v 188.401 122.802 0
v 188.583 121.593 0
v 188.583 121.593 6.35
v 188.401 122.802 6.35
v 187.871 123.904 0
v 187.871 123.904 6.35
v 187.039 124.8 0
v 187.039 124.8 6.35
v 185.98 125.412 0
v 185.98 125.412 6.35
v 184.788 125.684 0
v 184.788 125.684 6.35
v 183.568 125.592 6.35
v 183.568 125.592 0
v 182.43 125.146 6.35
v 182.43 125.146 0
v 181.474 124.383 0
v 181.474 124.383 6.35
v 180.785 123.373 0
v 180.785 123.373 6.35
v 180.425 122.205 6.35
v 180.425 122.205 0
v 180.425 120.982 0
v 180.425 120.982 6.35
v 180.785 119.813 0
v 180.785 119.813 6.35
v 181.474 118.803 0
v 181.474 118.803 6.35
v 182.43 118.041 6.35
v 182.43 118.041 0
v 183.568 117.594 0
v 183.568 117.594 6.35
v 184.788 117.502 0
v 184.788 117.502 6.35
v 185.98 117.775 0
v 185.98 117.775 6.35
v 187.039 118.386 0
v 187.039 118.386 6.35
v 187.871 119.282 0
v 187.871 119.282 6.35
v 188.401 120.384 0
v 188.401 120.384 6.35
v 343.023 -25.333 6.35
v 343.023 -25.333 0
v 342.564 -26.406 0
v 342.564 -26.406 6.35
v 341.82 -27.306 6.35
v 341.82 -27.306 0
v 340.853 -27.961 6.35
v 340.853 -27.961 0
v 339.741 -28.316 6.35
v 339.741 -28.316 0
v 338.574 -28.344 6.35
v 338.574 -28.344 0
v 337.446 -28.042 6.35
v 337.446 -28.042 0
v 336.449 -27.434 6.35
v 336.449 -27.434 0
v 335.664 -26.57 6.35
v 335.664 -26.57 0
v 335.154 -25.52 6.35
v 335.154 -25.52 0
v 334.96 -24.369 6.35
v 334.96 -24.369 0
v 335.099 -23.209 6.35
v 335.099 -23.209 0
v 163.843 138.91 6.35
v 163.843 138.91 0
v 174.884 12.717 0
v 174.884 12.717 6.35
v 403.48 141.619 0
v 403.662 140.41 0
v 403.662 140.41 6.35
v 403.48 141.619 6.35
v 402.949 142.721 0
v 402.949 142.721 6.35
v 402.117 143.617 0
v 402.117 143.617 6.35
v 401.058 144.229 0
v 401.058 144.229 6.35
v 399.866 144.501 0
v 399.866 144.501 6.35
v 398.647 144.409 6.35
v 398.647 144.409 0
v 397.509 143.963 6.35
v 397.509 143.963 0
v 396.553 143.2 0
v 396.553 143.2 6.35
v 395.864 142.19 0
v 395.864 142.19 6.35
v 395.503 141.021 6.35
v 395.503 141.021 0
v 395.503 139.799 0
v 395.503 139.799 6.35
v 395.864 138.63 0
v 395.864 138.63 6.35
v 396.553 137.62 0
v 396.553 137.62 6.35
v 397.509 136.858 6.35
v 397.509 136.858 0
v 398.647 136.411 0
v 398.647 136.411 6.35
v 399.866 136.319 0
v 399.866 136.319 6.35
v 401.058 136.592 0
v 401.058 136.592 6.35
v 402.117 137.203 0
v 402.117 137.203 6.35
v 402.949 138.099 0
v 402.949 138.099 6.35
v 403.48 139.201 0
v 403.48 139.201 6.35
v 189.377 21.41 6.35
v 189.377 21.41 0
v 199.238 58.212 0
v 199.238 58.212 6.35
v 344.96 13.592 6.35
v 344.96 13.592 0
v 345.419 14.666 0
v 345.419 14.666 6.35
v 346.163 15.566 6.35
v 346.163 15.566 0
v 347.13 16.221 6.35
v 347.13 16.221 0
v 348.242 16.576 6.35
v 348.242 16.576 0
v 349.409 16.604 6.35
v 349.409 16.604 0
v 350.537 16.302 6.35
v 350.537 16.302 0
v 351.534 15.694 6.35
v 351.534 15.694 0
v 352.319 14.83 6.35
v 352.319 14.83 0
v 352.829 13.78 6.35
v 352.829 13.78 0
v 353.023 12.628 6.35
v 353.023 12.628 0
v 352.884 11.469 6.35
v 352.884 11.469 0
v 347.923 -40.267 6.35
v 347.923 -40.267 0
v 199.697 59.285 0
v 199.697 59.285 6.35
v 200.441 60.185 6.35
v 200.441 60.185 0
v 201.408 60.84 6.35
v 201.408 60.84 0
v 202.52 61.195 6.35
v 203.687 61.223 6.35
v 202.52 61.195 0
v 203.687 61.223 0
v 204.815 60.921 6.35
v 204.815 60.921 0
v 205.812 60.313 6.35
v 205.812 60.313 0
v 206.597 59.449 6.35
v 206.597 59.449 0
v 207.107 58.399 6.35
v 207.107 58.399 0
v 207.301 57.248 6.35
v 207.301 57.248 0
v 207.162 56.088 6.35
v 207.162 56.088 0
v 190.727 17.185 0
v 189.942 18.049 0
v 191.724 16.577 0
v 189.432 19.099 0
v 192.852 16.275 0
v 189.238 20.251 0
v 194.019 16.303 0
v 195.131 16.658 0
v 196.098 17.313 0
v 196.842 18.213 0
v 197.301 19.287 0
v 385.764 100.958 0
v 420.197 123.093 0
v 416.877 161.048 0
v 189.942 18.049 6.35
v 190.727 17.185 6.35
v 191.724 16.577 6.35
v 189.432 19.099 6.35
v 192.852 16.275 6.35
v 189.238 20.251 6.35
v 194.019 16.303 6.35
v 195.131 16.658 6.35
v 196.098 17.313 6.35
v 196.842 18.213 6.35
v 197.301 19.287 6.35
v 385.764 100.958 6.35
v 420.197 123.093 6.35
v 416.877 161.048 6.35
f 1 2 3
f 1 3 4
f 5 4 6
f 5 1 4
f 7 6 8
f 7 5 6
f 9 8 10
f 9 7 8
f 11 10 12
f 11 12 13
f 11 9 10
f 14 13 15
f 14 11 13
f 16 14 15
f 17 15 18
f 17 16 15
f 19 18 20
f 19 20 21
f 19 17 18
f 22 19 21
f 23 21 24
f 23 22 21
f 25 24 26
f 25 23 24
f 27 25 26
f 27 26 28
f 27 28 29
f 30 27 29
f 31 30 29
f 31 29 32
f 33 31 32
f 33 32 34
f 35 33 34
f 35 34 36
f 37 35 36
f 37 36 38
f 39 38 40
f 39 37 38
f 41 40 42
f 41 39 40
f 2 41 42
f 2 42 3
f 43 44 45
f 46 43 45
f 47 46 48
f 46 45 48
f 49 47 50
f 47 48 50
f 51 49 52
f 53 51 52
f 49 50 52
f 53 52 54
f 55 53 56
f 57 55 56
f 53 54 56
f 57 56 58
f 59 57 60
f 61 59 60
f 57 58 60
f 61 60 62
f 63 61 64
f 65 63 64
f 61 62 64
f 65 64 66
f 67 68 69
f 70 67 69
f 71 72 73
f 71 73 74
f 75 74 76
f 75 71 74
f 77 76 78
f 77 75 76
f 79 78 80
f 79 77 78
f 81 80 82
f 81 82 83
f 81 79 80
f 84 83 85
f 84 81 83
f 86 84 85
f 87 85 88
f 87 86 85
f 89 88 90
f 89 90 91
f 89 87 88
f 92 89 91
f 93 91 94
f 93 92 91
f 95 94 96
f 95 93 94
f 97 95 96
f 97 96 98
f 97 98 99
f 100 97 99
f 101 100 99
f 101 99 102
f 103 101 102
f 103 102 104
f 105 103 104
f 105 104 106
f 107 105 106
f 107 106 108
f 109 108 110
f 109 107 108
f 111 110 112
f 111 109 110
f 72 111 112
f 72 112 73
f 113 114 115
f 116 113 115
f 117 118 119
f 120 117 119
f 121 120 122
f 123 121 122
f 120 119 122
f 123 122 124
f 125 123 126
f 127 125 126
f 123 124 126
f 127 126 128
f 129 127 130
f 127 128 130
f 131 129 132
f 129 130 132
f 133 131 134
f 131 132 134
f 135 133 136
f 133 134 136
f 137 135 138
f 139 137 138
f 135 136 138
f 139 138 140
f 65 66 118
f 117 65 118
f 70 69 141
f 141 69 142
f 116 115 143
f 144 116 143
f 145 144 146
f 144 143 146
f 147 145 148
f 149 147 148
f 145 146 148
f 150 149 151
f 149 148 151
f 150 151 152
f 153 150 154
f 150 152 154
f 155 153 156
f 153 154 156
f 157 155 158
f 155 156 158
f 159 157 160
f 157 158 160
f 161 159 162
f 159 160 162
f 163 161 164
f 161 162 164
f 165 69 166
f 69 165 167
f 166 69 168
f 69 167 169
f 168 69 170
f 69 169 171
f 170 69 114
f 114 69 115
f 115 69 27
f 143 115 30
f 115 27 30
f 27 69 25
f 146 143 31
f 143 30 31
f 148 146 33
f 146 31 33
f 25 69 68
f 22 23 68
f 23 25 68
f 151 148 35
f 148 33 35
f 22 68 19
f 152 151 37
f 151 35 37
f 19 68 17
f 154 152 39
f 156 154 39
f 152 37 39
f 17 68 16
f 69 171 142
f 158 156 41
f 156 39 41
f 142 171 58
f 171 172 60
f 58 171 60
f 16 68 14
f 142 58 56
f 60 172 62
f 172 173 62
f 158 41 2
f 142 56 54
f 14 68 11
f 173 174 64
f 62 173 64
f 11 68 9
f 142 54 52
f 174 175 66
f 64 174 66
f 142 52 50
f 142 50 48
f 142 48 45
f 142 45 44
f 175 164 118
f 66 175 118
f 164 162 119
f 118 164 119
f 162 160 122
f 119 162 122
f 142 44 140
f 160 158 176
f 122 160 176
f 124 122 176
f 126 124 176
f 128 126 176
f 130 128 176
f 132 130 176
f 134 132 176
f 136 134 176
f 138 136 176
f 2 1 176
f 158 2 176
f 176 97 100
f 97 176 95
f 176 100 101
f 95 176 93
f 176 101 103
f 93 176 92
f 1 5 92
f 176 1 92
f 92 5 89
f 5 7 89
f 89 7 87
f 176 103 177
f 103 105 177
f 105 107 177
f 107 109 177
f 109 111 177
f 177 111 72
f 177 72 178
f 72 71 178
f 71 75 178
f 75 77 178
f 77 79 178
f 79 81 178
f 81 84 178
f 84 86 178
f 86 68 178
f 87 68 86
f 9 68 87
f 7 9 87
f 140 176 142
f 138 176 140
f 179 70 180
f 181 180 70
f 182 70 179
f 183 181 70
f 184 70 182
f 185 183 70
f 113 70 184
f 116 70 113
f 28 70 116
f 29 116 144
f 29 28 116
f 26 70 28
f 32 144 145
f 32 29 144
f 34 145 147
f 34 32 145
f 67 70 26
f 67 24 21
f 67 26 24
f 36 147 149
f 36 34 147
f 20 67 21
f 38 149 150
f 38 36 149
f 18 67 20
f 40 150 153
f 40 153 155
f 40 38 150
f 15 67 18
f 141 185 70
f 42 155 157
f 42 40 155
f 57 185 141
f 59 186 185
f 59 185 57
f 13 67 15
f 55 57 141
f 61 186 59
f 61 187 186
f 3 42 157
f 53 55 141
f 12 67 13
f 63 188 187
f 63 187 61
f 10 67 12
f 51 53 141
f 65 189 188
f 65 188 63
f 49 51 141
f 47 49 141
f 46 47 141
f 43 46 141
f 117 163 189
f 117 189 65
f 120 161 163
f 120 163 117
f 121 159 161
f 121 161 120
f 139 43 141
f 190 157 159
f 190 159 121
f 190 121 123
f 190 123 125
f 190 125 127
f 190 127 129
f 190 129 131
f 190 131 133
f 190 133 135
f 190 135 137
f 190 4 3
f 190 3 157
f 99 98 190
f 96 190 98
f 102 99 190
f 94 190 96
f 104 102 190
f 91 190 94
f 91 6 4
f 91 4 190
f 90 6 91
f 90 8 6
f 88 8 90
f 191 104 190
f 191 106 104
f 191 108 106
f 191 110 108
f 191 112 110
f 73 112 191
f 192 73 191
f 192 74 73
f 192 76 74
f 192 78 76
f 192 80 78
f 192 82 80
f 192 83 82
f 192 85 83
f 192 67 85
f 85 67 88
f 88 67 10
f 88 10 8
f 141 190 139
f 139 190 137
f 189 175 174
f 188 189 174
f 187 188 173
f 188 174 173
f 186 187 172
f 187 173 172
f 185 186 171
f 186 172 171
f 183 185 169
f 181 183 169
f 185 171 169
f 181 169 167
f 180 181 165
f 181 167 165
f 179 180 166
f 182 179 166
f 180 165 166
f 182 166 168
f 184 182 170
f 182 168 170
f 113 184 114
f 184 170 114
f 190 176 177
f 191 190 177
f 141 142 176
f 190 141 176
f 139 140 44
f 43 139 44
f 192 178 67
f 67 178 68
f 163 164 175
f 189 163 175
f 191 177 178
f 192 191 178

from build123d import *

# Parameters (mm, degrees)
SKETCH2_R           = 4.1021
BOSS_EXTRUDE2_DEPTH = 6.35


with BuildPart() as part:
    # Sketch2 → Boss-Extrude2 (new body)
    with BuildSketch(Plane.XY):
        Polygon((416.876840794, 161.047876949), (163.843387479, 138.910318291), (174.883865248, 12.717079939), (347.922940958, -40.266575593), (385.763827966, 100.957537323), (420.197474593, 123.092858952), align=None)
        with Locations((184.481213377, 121.593126192)):
            Circle(SKETCH2_R, mode=Mode.SUBTRACT)
        with Locations((399.559648695, 140.410051051)):
            Circle(SKETCH2_R, mode=Mode.SUBTRACT)
        with BuildLine():
            Line((352.884248555, 11.469011076), (343.023242936, -25.332762905))
            ThreePointArc((343.023242936, -25.332762905), (337.999216999, -28.233385633), (335.098594272, -23.209359696))
            Line((335.098594272, -23.209359696), (344.959599891, 13.592414286))
            ThreePointArc((344.959599891, 13.592414286), (349.983625828, 16.493037013), (352.884248555, 11.469011076))
        make_face(mode=Mode.SUBTRACT)
        with BuildLine():
            ThreePointArc((199.237675668, 58.211701605), (204.261701605, 61.112324332), (207.162324332, 56.088298395))
            Line((207.162324332, 56.088298395), (197.301318714, 19.286524413))
            ThreePointArc((197.301318714, 19.286524413), (192.277292777, 16.385901686), (189.37667005, 21.409927623))
            Line((189.37667005, 21.409927623), (199.237675668, 58.211701605))
        make_face(mode=Mode.SUBTRACT)
    extrude(amount=BOSS_EXTRUDE2_DEPTH)


solid = part.part
